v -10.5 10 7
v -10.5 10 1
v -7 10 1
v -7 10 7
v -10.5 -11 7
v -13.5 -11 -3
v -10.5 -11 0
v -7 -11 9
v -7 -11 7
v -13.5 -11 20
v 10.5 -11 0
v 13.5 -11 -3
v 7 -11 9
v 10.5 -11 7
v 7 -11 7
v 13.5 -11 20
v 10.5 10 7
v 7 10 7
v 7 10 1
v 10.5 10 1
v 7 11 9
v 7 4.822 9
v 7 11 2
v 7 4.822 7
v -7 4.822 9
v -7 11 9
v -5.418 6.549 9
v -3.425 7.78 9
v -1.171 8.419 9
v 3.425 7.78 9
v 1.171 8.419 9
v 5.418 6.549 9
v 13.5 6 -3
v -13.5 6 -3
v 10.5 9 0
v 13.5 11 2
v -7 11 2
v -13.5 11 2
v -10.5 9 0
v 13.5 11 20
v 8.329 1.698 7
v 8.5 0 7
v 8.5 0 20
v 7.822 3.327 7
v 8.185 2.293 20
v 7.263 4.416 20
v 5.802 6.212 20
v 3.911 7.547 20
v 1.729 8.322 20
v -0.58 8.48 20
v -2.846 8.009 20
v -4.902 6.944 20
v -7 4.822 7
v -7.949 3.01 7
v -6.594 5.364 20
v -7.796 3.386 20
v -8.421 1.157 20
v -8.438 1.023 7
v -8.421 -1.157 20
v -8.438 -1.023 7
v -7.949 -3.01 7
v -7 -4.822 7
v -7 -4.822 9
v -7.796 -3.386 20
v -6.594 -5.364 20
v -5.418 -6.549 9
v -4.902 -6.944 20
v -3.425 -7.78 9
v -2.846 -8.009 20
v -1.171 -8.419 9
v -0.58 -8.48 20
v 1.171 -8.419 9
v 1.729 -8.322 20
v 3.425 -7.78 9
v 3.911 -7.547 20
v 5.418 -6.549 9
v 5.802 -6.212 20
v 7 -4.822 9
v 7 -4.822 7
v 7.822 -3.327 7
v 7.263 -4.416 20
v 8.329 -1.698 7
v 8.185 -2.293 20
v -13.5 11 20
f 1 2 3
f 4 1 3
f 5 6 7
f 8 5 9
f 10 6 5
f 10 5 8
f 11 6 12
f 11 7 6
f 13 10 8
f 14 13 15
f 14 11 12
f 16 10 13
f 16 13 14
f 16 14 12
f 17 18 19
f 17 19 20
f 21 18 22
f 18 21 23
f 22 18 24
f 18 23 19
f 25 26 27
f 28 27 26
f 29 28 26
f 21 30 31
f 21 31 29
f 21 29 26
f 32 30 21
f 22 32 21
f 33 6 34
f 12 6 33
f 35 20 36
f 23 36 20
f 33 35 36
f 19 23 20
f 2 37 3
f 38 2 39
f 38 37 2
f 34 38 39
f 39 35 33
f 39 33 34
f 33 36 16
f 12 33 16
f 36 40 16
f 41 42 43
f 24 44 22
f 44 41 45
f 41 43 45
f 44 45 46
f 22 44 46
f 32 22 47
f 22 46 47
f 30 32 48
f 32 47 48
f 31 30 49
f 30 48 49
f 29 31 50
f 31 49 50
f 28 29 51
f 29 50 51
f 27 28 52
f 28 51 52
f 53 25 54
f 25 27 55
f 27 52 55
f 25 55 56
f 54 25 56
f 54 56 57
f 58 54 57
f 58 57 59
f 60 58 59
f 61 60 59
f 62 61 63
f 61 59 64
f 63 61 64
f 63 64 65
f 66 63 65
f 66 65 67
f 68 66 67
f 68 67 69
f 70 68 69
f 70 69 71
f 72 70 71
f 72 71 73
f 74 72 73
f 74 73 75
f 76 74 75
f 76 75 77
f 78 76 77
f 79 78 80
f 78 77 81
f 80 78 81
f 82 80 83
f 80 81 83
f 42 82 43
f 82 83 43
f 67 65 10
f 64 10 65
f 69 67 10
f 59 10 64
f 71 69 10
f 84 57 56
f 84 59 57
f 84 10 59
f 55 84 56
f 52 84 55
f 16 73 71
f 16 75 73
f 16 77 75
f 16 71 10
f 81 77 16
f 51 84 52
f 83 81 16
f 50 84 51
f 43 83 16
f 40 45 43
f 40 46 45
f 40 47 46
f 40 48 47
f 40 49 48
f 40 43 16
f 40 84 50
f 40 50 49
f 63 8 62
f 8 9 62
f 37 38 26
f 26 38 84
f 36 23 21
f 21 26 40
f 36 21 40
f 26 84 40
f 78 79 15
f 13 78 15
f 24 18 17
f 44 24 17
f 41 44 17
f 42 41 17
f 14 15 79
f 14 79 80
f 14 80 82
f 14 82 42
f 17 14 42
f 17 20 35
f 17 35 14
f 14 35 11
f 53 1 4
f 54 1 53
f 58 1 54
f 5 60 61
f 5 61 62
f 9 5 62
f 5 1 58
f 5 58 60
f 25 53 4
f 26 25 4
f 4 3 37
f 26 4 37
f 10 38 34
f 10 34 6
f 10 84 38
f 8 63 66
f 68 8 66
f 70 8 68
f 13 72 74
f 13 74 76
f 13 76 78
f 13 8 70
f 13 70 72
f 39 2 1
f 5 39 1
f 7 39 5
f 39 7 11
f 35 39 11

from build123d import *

# Parameters (mm, degrees)
F0_W         = 27
F0_H         = 22
F1_DEPTH     = 20
F2_W         = 21
F2_H         = 21
F3_DEPTH     = 6
F5_DEPTH     = 2
F7_DEPTH     = 20
F8_DEPTH     = 6
F9_W         = 27
F9_H         = 22
F10_DEPTH    = 3
F11_T1_DEPTH = 52.7168298797
F12_R        = 8.5
F13_DEPTH    = 20
F14_DEPTH    = 1


# Not quite as in the source:
# - a fillet or chamfer that OpenCascade refuses, or shapes differently, is made with other operations: its cross-section is extruded or revolved along the edge and cut away or added


with BuildPart() as f1:
    # F0 (on Top) → F1 (new body)
    with BuildSketch(Plane.XY):
        Rectangle(F0_W, F0_H)
    extrude(amount=F1_DEPTH)

    # F2 (on face) → F3 (cut)
    with BuildSketch(Plane(origin=(0, 0, 0), x_dir=(1, 0, 0), z_dir=(0, 0, -1))):
        with Locations((0, 0.5)):
            Rectangle(F2_W, F2_H)
    extrude(amount=-F3_DEPTH, mode=Mode.SUBTRACT)

    # F4 (on face) → F5 (cut)
    with BuildSketch(Plane(origin=(0, 0, 6), x_dir=(1, 0, 0), z_dir=(0, 0, -1))):
        Polygon((0, 11), (-7, 11), (-7, -11), (7, -11), (7, 11), align=None)
    extrude(amount=-F5_DEPTH, mode=Mode.SUBTRACT)

    # F6 (on face) → F7 (cut)
    with BuildSketch(Plane.XY.offset(20)):
        Polygon((0, -3), (3, -3), (3, 3), (-3, 3), (-3, -3), align=None)
    extrude(amount=-F7_DEPTH, mode=Mode.SUBTRACT)

    # F8 (cut): a face of the model
    f8_faces = [f1.faces().sort_by_distance(p)[0] for p in [
        (0, 10.5, 6),
    ]]
    extrude(f8_faces, amount=-F8_DEPTH, mode=Mode.SUBTRACT)

    # F9 (on face) → F10 (join)
    with BuildSketch(Plane(origin=(0, 0, 0), x_dir=(1, 0, 0), z_dir=(0, 0, -1))):
        Rectangle(F9_W, F9_H)
    extrude(amount=F10_DEPTH)

    # F11: chamfer of 5 on 1 edges, made by hand

    # F11_s2 → F11_t1 (cut)
    with BuildSketch(Plane.YZ.offset(-26.3584149398)):
        Polygon((11, 2), (6, -3), (11, -3), align=None)
    extrude(amount=F11_T1_DEPTH, mode=Mode.SUBTRACT)

    # F12 (on face) → F13 (cut)
    with BuildSketch(Plane.XY.offset(20)):
        Circle(F12_R)
    extrude(amount=-F13_DEPTH, mode=Mode.SUBTRACT)

    # F14 (cut): faces of the model
    f14_faces = [f1.faces().sort_by_distance(p)[0] for p in [
        (-8.9267642555, -0.5771749807, 6),
        (8.9267642555, -0.5771749807, 6),
        (0, -9.0505273171, 8),
        (0, 9.0505273171, 8),
    ]]
    extrude(f14_faces, amount=-F14_DEPTH, mode=Mode.SUBTRACT)


solid = f1.part
